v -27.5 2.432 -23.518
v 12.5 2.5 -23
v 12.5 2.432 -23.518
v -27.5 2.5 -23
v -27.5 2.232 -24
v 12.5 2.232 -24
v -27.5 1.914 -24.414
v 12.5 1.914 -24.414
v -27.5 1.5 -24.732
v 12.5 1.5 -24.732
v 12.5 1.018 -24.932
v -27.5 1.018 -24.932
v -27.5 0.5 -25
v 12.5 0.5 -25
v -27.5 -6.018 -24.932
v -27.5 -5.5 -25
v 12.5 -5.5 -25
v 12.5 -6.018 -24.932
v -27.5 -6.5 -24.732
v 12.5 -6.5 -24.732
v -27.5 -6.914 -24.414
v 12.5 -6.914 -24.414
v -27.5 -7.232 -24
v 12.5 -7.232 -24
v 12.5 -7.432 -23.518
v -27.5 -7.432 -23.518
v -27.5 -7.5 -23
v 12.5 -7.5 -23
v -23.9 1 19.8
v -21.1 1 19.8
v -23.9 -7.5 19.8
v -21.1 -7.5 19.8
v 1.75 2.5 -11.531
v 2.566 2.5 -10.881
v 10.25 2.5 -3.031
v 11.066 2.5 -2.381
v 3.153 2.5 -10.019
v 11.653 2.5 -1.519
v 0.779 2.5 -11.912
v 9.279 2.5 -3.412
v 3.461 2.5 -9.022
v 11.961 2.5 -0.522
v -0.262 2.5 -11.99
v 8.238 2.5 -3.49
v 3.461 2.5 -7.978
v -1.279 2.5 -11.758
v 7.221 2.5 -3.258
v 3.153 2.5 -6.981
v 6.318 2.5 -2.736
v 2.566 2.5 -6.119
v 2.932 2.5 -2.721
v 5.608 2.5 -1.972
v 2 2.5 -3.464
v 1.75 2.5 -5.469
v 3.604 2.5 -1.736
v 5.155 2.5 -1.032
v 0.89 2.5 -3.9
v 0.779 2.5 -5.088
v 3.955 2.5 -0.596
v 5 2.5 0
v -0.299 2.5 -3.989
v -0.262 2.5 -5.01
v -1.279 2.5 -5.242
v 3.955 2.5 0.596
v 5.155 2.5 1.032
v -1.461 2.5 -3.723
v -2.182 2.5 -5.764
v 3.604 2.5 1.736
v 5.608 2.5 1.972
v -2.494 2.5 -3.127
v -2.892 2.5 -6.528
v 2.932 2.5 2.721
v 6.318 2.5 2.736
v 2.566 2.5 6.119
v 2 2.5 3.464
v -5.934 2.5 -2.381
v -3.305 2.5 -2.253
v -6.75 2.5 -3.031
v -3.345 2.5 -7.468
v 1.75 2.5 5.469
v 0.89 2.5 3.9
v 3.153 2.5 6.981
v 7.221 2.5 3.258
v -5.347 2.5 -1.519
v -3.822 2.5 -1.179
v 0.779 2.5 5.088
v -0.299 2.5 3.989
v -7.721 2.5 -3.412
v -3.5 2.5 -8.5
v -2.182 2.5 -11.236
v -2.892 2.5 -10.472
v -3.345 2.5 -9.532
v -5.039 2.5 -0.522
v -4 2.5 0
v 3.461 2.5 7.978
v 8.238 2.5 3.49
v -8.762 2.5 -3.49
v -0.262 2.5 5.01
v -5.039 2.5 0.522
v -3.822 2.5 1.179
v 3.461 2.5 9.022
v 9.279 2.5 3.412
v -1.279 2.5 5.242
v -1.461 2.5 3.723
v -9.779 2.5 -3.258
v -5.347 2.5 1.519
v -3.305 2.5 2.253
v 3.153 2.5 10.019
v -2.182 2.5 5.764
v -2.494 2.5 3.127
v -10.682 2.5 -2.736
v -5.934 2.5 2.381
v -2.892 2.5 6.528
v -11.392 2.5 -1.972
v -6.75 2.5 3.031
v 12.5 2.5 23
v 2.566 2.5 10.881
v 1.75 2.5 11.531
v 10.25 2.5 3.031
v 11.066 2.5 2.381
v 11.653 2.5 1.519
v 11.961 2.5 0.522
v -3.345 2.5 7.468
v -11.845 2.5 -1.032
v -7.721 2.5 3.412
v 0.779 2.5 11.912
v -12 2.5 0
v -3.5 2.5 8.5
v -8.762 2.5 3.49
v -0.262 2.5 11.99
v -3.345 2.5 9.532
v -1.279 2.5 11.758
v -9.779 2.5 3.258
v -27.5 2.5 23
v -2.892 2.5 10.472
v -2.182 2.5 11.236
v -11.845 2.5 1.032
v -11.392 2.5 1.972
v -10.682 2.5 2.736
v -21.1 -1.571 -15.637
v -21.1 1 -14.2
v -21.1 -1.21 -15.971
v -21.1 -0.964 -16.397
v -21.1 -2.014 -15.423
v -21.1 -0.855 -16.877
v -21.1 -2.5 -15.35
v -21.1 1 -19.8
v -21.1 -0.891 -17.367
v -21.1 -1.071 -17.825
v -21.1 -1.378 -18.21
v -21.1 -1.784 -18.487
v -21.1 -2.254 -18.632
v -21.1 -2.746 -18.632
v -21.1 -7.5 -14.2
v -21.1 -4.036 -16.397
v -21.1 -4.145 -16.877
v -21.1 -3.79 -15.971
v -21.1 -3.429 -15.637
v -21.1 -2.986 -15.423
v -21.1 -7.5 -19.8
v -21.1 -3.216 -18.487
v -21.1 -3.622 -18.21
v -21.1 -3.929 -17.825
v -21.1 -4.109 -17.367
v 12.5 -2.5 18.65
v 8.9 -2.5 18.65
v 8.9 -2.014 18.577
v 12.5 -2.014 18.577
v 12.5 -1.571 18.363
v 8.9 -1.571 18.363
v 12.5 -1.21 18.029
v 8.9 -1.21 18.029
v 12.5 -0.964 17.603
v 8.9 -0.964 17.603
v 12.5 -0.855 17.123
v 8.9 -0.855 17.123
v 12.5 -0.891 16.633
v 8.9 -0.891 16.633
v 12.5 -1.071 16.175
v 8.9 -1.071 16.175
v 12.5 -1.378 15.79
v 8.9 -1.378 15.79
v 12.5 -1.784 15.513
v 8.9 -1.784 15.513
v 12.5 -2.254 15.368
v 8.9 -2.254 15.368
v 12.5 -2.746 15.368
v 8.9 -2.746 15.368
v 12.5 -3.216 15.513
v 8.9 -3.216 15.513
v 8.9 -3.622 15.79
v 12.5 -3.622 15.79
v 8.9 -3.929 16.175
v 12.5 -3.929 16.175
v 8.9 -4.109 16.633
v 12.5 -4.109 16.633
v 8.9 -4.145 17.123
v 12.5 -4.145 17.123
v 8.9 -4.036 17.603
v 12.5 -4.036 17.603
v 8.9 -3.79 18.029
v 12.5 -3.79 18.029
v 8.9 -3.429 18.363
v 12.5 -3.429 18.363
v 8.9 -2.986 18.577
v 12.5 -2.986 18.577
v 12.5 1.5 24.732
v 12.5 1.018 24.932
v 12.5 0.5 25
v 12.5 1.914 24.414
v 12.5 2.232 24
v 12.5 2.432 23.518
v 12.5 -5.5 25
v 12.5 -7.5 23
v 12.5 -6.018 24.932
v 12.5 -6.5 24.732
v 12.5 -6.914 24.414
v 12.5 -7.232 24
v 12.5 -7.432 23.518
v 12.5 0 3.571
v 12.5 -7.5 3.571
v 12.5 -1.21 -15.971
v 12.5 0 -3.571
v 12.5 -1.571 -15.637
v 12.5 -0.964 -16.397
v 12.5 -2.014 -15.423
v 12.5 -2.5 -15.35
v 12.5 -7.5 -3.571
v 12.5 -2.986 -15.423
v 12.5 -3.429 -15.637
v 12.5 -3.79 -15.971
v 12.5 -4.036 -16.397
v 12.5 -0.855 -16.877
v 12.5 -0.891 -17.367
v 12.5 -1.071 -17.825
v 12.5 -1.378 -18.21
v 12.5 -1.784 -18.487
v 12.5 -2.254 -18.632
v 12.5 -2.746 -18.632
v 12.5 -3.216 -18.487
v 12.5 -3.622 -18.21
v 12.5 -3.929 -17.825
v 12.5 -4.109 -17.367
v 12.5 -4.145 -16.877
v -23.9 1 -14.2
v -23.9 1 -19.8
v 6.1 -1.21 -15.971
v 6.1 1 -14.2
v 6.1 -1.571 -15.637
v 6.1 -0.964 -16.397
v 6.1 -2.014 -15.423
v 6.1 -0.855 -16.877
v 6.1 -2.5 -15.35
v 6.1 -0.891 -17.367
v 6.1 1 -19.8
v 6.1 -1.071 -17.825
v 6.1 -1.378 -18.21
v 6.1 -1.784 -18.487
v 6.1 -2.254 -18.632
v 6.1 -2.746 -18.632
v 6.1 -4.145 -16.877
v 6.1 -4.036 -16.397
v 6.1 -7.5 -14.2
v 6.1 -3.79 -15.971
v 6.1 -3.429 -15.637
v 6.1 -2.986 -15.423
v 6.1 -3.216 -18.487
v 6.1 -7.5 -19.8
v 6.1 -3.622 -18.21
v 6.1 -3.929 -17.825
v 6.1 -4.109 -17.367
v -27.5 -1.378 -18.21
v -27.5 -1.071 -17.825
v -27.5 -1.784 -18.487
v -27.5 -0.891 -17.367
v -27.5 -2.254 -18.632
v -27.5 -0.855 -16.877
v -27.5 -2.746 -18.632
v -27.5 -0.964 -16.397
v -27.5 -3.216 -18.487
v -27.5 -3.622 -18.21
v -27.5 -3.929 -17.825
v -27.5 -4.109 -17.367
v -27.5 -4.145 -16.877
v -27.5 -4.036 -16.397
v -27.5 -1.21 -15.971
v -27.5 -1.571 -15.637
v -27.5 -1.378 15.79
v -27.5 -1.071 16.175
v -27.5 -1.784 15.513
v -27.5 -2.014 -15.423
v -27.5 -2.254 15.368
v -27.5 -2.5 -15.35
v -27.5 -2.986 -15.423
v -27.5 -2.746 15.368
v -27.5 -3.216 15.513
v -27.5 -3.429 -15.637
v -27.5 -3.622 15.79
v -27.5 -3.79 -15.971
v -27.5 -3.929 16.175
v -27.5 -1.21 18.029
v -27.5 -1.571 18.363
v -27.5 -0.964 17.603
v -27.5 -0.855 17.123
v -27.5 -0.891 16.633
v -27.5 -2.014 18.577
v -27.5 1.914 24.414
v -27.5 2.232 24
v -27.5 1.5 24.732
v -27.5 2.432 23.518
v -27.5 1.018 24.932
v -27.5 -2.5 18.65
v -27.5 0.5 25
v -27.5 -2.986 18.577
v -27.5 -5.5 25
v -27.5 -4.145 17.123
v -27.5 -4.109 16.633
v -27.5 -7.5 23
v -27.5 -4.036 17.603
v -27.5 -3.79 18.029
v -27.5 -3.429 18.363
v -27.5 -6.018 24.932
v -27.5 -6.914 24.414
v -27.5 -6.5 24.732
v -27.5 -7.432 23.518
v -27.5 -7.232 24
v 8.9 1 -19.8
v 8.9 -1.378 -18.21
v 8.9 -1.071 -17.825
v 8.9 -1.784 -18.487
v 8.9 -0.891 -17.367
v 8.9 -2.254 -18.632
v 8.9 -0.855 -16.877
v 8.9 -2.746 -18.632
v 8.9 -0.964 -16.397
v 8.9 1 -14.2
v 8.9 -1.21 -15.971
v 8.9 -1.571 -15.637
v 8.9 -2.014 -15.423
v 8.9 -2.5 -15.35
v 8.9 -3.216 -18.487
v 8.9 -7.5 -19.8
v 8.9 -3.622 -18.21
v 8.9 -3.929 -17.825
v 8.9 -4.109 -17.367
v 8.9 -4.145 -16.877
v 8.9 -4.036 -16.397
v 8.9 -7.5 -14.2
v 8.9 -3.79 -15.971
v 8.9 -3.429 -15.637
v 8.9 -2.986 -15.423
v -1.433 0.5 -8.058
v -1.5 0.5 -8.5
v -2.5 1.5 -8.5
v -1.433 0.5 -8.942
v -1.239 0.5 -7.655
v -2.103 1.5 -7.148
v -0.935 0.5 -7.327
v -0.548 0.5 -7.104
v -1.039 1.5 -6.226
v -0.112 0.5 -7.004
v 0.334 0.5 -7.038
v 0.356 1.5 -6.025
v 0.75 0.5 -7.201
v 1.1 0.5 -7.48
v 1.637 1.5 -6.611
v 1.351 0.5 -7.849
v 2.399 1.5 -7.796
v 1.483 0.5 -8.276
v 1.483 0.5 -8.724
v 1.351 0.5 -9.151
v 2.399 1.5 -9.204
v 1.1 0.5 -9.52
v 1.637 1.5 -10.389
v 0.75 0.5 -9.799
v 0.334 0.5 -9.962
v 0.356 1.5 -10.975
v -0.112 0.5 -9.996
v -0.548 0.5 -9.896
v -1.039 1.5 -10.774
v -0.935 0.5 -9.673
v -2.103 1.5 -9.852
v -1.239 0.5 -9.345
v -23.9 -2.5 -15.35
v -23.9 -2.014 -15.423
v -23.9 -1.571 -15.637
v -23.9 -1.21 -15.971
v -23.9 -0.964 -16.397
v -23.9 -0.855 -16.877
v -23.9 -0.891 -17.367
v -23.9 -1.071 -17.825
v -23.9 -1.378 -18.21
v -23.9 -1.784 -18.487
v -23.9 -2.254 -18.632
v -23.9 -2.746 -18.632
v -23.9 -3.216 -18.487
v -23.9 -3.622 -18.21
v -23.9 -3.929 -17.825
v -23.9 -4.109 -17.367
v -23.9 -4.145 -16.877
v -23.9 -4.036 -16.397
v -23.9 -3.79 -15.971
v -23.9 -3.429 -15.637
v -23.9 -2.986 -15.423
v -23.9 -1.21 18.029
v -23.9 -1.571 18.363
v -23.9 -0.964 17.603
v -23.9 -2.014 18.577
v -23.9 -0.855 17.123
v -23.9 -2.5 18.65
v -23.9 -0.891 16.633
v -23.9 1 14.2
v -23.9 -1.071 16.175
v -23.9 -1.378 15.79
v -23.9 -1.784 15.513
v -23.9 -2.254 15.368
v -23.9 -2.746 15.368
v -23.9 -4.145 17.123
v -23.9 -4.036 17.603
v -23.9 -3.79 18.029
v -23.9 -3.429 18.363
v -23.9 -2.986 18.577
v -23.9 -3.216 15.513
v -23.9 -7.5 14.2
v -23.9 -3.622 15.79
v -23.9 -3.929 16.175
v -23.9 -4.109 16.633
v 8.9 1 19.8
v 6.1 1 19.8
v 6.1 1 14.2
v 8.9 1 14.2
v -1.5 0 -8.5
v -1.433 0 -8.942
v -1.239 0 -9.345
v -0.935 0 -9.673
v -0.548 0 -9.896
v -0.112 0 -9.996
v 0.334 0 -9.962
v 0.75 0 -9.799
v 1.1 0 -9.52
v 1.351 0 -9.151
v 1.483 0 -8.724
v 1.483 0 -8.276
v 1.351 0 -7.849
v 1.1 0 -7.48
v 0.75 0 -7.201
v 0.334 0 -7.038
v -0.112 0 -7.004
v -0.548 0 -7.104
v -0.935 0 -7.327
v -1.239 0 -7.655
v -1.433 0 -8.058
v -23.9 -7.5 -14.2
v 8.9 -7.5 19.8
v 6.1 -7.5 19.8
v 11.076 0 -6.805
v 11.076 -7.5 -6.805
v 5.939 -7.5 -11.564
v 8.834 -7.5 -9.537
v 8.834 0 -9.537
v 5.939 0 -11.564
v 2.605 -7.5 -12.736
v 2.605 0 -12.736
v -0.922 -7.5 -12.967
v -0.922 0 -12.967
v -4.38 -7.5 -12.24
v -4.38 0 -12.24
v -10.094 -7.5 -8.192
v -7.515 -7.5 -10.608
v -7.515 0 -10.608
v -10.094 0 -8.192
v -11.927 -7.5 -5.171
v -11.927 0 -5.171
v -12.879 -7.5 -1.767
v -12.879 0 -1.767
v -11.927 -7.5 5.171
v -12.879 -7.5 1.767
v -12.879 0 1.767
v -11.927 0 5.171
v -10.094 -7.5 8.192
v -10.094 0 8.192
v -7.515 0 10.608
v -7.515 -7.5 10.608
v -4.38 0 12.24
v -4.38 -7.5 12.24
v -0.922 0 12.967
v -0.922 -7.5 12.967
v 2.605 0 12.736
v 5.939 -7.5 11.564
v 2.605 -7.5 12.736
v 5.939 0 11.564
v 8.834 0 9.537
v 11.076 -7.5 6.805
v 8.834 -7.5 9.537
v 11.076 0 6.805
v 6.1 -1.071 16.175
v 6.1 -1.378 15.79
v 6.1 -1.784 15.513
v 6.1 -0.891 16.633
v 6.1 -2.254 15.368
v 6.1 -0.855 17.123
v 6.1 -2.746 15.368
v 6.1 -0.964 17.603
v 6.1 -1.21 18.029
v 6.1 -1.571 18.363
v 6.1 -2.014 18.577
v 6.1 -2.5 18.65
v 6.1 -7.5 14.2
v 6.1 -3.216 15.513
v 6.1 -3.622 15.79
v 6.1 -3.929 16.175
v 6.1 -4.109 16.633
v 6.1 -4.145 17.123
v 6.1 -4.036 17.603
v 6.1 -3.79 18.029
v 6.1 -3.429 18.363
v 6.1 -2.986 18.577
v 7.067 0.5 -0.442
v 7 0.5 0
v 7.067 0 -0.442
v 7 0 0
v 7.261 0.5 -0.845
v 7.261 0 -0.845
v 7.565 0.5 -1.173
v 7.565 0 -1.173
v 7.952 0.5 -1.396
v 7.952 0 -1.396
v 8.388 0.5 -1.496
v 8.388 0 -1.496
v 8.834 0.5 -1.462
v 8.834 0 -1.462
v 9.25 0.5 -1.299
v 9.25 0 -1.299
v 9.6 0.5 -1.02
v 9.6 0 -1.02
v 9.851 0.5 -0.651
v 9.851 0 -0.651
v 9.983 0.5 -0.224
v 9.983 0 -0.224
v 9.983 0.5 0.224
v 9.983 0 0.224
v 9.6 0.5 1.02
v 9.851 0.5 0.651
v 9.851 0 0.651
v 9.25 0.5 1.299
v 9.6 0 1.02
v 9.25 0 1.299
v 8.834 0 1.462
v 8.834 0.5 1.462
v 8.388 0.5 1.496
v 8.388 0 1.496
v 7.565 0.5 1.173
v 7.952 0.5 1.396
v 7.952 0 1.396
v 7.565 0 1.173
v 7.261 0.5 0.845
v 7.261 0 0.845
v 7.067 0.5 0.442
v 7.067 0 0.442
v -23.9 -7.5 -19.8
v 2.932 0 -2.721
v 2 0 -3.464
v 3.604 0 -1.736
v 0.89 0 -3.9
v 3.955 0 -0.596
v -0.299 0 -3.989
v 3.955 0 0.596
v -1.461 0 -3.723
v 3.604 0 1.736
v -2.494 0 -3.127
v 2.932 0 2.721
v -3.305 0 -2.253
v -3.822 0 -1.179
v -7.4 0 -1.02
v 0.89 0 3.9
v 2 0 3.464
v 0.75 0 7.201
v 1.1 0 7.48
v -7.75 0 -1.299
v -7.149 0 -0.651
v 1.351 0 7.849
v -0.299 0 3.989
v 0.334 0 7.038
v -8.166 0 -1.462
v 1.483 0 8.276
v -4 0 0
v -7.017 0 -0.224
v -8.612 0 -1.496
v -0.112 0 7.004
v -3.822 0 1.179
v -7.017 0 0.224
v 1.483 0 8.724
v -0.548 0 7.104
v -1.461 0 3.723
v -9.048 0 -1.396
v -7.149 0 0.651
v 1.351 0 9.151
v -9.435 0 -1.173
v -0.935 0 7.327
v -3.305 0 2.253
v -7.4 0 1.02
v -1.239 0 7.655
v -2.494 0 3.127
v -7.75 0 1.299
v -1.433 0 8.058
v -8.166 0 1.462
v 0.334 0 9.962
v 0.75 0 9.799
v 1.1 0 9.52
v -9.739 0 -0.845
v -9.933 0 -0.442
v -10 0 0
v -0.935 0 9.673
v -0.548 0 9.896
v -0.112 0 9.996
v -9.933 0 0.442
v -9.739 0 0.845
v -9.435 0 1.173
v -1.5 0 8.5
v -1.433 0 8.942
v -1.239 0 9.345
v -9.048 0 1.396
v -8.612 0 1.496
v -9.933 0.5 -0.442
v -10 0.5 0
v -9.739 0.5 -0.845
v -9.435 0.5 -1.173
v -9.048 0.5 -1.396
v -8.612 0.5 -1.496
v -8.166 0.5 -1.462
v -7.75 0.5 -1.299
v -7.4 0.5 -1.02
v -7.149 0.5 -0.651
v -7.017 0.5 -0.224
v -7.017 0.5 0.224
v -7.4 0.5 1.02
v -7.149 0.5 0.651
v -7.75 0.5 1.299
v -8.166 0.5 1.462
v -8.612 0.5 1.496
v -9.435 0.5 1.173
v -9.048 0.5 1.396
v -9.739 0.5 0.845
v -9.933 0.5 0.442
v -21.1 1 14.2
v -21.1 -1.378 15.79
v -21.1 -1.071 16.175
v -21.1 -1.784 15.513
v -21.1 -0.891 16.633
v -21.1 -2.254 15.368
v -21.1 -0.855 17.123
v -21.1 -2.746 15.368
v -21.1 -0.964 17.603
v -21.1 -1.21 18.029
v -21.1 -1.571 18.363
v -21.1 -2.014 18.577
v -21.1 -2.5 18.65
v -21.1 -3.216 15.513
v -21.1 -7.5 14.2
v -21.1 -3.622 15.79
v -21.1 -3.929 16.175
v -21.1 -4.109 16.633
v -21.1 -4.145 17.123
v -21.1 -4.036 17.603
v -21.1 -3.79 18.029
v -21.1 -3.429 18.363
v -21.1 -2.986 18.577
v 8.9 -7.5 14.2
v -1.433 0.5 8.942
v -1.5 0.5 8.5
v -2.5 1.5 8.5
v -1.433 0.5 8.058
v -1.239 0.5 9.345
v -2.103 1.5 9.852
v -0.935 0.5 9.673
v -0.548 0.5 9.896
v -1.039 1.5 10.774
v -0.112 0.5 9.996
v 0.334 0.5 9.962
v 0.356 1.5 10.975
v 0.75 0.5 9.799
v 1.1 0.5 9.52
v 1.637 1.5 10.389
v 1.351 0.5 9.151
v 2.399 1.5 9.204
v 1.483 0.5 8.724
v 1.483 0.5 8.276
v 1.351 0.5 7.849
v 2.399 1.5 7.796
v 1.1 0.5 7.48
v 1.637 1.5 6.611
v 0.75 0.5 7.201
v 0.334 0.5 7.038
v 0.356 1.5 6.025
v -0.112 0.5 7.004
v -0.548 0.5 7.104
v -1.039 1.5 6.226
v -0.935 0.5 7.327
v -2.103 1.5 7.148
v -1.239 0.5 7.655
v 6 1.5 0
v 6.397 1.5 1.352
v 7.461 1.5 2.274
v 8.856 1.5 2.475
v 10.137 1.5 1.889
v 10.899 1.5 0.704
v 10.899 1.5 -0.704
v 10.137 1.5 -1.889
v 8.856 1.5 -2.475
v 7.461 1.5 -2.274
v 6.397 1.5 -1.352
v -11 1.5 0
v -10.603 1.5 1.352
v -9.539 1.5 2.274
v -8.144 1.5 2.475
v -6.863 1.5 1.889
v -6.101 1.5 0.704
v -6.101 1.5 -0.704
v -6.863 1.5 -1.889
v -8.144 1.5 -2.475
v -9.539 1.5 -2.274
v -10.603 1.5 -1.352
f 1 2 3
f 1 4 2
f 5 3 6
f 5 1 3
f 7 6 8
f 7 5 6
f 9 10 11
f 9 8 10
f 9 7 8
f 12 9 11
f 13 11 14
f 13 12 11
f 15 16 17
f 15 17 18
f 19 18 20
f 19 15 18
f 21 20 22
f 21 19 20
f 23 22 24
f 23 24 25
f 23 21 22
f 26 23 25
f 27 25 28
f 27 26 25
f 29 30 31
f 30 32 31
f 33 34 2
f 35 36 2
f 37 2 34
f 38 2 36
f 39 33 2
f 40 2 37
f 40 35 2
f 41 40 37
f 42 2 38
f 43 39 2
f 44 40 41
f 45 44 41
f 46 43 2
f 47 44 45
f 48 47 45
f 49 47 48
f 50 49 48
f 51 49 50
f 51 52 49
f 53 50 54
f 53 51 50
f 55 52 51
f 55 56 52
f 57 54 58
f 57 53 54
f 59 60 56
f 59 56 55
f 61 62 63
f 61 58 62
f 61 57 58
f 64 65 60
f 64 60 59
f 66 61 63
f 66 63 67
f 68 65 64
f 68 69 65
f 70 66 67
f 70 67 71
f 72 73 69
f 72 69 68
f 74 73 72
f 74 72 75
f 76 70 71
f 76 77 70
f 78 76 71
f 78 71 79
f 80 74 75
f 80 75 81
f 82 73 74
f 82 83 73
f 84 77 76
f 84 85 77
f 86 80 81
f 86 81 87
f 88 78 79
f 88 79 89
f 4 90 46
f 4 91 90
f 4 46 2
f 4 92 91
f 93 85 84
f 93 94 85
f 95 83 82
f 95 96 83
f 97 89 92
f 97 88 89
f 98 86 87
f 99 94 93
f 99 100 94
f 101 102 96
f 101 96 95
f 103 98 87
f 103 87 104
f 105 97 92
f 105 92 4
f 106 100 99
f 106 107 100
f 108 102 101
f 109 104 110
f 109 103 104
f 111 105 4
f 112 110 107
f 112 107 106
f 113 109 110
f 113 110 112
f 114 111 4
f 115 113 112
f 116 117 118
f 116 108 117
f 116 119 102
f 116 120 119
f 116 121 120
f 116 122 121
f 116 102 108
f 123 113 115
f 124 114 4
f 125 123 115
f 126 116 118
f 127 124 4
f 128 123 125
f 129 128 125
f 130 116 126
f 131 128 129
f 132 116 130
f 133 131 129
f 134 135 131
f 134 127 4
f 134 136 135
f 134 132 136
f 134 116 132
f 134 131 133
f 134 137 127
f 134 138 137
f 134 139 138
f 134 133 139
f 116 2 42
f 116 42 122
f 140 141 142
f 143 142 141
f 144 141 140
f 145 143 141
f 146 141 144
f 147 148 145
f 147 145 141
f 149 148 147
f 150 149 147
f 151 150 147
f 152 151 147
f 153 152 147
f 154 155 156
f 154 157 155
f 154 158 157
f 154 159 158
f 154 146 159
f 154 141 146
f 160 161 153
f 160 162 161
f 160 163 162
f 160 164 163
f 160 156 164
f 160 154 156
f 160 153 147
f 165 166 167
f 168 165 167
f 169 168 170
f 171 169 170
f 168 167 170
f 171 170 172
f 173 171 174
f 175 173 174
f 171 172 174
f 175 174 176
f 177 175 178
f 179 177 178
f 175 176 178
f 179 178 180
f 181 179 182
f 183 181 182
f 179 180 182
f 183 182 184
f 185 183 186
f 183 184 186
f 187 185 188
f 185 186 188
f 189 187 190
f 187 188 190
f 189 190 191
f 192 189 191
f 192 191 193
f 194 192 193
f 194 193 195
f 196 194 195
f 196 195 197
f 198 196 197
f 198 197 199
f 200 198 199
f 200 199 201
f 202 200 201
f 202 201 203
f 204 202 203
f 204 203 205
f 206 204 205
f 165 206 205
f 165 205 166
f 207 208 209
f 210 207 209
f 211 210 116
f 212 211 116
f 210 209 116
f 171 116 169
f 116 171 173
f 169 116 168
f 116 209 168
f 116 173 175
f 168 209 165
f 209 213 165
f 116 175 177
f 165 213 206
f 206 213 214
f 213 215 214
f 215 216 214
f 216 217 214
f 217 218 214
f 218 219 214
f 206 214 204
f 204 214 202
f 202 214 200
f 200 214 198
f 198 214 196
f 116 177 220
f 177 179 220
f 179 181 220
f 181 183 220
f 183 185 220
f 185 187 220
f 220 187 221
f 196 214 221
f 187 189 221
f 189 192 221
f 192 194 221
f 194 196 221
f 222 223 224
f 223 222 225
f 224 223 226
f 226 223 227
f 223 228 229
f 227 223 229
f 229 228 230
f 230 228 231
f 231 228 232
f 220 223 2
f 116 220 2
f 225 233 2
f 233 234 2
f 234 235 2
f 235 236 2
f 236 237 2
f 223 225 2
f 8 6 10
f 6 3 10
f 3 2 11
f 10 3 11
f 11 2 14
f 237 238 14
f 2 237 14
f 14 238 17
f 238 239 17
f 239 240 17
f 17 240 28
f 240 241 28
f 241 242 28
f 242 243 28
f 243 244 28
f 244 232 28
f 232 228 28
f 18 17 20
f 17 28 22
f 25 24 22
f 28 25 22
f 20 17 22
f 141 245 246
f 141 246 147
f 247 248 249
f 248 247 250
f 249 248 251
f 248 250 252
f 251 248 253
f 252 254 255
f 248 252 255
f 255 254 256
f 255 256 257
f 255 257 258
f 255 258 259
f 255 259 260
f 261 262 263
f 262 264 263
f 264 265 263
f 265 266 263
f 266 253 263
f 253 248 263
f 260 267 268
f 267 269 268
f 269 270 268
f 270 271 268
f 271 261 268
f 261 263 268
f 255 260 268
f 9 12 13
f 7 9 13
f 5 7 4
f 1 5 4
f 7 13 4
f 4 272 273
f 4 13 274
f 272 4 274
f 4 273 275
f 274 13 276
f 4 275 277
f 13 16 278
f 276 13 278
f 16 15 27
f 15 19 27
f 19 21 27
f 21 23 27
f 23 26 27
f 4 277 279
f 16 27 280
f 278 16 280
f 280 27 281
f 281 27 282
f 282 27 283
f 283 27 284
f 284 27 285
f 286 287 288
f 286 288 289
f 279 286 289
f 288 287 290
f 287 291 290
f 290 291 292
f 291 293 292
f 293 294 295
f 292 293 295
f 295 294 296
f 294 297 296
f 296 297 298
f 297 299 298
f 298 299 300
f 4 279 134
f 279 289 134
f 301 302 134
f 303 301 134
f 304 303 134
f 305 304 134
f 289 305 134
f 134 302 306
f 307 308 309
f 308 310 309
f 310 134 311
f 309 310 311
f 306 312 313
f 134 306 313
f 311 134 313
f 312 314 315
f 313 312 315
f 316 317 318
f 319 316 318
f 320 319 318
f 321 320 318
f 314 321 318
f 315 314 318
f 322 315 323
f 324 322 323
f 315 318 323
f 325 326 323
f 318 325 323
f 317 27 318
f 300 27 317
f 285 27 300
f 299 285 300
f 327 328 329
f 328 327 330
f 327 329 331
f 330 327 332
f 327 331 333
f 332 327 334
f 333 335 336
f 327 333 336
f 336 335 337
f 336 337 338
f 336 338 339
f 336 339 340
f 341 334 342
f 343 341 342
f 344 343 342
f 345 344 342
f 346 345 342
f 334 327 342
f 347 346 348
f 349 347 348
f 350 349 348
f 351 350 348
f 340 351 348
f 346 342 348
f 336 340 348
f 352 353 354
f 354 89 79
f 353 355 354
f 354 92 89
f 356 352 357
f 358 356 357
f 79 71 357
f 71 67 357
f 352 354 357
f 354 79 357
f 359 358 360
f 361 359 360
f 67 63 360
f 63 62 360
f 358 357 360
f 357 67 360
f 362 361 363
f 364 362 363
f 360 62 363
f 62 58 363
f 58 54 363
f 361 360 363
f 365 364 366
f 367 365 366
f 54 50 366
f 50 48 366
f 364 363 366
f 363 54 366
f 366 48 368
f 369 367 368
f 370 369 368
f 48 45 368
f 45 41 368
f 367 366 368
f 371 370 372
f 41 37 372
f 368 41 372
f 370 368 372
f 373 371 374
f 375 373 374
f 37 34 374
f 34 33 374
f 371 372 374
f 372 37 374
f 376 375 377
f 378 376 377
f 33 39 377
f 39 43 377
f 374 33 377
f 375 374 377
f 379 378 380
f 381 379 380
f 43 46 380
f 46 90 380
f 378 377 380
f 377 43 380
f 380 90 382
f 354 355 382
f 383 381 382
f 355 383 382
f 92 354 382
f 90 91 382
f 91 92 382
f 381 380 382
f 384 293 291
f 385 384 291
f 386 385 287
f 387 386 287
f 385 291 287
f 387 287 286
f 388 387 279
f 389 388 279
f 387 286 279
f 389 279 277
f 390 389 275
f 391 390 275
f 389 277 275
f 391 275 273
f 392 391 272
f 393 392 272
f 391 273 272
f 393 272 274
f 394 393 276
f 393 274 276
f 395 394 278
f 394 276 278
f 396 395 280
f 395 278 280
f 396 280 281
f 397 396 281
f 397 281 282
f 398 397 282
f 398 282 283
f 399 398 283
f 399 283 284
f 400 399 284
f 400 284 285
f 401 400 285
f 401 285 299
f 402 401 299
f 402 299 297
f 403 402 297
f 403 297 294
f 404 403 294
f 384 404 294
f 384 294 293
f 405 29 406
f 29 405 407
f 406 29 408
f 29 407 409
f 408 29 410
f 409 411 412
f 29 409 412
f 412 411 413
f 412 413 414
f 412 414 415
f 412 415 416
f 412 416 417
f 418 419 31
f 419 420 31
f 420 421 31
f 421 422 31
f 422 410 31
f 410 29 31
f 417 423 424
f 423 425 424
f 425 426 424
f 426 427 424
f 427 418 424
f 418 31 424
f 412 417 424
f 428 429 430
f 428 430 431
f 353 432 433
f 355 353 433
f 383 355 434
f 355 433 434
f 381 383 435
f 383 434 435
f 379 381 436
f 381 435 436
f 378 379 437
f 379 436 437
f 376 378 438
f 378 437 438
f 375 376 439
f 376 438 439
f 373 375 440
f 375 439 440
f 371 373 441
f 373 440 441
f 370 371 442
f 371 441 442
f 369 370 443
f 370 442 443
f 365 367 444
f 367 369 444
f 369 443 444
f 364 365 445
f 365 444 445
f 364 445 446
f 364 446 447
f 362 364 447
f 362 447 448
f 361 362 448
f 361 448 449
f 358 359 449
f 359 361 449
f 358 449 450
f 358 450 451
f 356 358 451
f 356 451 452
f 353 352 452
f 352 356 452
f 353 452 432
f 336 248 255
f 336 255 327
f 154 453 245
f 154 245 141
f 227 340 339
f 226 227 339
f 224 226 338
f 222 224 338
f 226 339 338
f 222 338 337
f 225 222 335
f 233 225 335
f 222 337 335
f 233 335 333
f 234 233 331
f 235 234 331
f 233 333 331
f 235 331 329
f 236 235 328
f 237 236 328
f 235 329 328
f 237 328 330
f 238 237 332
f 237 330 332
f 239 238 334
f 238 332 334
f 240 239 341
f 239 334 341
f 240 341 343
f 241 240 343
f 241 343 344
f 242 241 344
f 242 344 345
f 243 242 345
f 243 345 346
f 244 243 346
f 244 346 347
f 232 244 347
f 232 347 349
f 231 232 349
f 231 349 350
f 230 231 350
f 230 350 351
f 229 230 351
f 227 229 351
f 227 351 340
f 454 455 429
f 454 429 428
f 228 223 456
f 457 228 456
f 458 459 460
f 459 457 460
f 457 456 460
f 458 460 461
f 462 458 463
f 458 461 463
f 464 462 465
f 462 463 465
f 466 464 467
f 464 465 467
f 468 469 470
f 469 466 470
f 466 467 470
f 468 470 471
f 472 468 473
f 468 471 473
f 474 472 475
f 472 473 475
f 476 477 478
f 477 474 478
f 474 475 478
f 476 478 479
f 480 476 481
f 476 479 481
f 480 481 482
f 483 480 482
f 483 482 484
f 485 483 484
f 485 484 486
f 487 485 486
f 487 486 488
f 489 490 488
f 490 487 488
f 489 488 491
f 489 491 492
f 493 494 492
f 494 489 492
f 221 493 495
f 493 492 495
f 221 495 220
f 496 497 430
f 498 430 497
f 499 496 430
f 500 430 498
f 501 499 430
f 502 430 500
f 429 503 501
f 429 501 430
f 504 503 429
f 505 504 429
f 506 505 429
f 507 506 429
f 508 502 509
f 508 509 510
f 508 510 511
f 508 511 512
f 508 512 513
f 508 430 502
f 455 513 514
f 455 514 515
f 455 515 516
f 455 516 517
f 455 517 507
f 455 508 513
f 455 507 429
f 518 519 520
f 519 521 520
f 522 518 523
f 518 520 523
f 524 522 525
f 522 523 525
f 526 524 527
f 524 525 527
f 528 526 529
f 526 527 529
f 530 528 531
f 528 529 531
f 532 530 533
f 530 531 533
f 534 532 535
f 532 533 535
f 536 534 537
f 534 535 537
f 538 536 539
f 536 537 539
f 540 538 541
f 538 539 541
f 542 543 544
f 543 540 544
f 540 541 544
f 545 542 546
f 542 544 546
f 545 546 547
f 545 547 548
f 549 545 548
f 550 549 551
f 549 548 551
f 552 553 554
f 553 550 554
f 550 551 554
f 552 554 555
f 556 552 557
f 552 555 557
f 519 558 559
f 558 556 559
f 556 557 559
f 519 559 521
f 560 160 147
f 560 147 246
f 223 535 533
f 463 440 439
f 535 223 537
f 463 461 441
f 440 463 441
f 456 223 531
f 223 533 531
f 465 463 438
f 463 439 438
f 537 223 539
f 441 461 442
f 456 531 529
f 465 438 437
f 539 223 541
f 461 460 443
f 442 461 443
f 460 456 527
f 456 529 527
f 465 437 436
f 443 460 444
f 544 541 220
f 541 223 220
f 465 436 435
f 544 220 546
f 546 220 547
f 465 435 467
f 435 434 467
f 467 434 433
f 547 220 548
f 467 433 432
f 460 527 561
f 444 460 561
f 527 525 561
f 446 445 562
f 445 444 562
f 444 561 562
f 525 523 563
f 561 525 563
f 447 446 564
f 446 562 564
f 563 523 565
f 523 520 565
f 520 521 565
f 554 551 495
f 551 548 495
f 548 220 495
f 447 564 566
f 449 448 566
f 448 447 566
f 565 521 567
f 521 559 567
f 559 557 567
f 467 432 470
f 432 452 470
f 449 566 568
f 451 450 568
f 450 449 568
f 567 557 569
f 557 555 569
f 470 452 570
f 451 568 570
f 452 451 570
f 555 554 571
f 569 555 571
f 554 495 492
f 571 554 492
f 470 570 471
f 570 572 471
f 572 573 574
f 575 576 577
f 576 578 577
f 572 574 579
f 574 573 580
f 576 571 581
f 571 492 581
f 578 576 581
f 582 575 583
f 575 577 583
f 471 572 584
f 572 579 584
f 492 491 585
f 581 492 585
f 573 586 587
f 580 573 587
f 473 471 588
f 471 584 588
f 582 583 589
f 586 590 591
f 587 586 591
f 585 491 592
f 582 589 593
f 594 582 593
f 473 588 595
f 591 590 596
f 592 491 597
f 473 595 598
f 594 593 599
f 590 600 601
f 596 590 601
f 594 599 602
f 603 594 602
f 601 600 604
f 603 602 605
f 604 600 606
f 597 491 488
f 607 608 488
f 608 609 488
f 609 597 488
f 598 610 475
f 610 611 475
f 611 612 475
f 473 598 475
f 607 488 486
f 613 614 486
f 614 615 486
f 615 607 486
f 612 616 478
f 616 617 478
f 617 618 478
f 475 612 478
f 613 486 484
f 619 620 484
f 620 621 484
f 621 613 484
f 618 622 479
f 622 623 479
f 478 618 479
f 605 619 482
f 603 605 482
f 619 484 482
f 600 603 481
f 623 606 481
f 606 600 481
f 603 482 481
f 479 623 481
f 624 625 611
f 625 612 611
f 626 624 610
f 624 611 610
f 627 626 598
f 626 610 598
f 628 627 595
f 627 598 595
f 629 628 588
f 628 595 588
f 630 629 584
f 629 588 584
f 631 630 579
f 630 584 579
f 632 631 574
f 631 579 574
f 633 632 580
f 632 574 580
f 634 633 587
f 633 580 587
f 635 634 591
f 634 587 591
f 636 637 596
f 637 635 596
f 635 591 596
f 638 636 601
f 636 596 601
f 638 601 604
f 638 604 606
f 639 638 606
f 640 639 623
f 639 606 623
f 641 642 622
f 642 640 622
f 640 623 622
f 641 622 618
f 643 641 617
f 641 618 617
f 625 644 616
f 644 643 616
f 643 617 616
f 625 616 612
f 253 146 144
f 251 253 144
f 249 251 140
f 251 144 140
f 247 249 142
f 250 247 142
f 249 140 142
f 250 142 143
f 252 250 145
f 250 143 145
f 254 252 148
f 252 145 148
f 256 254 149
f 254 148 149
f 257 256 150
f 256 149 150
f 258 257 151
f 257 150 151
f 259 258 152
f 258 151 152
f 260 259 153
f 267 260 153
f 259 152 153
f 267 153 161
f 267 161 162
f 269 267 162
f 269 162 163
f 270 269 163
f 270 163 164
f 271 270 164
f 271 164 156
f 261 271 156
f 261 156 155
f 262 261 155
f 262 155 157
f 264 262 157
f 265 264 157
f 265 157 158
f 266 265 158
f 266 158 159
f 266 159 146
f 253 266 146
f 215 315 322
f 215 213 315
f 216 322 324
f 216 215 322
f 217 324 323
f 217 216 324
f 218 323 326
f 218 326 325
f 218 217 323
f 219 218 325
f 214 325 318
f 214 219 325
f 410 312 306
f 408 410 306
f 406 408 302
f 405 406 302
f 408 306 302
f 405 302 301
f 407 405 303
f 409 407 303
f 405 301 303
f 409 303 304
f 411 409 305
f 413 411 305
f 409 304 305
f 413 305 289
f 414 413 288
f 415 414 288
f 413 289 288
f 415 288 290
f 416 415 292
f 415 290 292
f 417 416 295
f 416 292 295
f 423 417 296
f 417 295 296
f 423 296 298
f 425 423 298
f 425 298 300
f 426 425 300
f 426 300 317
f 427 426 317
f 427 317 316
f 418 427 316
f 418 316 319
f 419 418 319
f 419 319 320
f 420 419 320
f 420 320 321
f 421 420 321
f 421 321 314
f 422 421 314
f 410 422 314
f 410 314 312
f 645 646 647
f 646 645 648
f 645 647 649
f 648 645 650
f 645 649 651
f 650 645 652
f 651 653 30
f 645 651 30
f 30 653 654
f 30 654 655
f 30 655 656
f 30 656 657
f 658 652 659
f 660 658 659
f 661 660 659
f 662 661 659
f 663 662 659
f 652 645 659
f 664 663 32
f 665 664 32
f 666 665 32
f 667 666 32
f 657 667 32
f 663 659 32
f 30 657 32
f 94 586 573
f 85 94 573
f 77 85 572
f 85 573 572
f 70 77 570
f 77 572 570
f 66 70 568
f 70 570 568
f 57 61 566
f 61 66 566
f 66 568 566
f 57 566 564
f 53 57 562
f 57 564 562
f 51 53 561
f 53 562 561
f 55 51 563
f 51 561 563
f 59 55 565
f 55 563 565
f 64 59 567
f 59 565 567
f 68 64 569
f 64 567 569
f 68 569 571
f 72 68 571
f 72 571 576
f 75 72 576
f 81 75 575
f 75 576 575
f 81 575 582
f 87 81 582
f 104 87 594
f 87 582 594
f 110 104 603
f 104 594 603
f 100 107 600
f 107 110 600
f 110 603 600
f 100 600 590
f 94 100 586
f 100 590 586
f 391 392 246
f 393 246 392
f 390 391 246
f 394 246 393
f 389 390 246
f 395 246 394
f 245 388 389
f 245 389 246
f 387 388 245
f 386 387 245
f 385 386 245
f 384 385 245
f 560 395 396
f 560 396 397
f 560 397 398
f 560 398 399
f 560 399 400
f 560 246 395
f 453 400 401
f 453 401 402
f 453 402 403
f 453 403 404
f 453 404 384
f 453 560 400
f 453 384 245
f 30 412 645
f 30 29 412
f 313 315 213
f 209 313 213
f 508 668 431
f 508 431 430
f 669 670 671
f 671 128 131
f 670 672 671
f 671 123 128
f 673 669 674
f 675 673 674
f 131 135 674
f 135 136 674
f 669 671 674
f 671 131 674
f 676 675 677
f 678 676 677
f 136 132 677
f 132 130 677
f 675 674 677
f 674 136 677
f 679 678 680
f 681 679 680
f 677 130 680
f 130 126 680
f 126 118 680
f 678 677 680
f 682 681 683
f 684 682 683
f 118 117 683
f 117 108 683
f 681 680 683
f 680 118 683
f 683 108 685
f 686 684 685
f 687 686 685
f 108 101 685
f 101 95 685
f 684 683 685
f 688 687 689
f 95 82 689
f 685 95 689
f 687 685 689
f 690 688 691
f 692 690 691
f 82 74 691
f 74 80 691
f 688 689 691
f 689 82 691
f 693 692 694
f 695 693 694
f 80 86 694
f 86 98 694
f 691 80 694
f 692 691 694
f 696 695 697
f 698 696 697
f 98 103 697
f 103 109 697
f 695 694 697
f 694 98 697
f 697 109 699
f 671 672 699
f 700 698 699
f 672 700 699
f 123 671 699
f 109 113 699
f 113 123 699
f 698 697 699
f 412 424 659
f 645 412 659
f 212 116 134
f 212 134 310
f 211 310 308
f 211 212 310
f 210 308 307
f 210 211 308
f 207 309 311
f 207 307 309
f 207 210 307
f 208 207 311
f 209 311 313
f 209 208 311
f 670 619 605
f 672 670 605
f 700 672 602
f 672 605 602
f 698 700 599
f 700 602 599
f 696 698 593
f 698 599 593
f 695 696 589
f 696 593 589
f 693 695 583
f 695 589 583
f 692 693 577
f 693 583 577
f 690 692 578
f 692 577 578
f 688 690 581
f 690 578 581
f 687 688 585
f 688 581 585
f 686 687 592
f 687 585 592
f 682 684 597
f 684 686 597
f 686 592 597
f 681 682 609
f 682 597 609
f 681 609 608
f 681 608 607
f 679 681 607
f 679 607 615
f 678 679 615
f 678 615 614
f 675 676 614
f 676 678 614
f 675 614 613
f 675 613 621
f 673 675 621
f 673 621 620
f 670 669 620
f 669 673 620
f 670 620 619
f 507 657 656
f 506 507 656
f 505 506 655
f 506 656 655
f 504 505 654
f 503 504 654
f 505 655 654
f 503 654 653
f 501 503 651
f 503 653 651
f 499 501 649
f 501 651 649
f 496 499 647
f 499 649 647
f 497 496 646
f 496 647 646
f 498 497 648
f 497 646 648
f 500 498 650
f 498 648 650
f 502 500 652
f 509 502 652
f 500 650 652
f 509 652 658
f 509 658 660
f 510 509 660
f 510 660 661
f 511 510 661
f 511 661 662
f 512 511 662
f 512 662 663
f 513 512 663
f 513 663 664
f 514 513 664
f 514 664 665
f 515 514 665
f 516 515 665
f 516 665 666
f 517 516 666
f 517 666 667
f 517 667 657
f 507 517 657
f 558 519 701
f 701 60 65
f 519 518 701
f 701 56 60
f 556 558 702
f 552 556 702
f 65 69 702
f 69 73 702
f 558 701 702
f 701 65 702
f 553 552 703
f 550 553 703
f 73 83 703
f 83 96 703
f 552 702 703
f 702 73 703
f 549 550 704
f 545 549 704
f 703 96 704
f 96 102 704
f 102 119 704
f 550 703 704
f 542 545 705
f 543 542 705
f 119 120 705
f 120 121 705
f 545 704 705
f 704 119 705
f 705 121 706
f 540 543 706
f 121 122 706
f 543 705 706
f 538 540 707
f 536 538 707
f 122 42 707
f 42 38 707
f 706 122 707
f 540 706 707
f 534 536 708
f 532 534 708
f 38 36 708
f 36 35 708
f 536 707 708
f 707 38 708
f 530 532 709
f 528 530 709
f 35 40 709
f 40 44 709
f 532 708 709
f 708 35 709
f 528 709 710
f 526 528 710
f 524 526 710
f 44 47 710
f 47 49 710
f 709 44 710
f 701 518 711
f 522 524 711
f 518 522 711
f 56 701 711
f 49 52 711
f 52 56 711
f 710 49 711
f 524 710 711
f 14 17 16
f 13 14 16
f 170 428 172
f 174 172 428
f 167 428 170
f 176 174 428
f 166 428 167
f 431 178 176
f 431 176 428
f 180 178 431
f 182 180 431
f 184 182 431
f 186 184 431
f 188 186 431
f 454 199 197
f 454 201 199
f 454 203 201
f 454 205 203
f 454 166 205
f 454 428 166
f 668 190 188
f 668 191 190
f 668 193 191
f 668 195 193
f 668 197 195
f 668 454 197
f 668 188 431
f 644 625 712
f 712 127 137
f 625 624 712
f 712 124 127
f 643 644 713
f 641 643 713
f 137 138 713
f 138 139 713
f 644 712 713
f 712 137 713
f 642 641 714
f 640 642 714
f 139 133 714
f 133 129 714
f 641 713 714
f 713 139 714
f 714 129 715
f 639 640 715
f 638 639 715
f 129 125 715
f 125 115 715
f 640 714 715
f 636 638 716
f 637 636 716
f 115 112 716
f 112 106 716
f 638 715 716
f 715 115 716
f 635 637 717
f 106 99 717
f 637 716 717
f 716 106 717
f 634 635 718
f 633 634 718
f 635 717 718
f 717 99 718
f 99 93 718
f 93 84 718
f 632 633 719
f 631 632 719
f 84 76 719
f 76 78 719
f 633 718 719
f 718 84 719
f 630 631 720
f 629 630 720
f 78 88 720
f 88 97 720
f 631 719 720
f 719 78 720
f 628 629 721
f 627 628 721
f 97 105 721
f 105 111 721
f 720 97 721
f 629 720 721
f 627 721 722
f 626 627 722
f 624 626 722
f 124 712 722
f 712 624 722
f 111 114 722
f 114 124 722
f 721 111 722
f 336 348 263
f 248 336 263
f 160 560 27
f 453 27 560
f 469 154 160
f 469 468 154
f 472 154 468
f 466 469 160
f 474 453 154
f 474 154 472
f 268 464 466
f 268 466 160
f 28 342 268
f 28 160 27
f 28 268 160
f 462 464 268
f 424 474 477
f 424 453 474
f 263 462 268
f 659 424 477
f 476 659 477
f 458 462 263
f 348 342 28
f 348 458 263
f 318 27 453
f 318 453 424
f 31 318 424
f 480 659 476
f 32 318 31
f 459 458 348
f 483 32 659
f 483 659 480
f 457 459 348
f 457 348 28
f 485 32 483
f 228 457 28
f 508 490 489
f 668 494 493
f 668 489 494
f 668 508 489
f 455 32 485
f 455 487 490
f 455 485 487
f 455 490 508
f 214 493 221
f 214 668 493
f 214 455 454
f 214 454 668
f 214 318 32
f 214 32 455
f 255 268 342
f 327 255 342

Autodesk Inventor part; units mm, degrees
ref_plane "YZ Plane" through (0, 0, 0) normal (1, 0, 0) x (0, 1, 0)
ref_plane "XZ Plane" through (0, 0, 0) normal (0, 1, 0) x (-1, 0, 0)
ref_plane "XY Plane" through (0, 0, 0) normal (0, 0, 1) x (1, 0, 0)
sketch "Эскиз1" plane through (0, 0, 0) normal (0, 1, 0) x (-1, 0, 0)
  circle A0 centre (0, 0) radius 12.5 construction
  circle A1 centre (0, 0) radius 8.5 construction
  circle A2 centre (8.5, 0) radius 1.5
  circle A3 centre (-8.5, 0) radius 1.5
  circle A4 centre (0, 0) radius 4
  line L0 (27.5, 25) -> (-12.5, 25)
  line L1 (-12.5, 25) -> (-12.5, -25)
  line L2 (-12.5, -25) -> (27.5, -25)
  line L3 (27.5, -25) -> (27.5, 25)
  line L4 (0, -12.5) -> (0, 12.5) construction
  line L5 (-12.5, 0) -> (12.5, 0) construction
  circle A5 centre (0, -8.5) radius 1.5
  circle A6 centre (0, 8.5) radius 1.5
  point P0 (7.5, 25)
  point P1 (7.5, -25)
  dimension "d0" = 25
  dimension "d1" = 17
  dimension "d2" = 3
  dimension "d3" = 3
  dimension "d4" = 8
  dimension "d5" = 40
  dimension "d6" = 50
  dimension "d7" = 25
  dimension "d26" = 25
  dimension "d31" = 90
  dimension "d32" = 90
  dimension "d33" = 3
  dimension "d34" = 3
extrude "Выдавливание1" add sketch "Эскиз1" along normal blind 2.5
sketch "Эскиз2" plane through (0, 0, 0) normal (0, -1, 0) x (1, 0, 0)
  circle A0 centre (0, 0) radius 13
  line L0 (12.5, 25) -> (12.5, -25) projected
  line L1 (-27.5, 25) -> (12.5, 25) projected
  line L2 (-27.5, -25) -> (-27.5, 25) projected
  line L3 (12.5, -25) -> (-27.5, -25) projected
  circle A1 centre (-8.5, 0) radius 1.5 projected
  circle A2 centre (8.5, 0) radius 1.5 projected
  circle A3 centre (0, 0) radius 4 projected
  point P0 (12.5, -3.5707)
  point P1 (12.5, 3.5707)
  dimension "d10" = 26
extrude "Выдавливание2" add sketch "Эскиз2" along normal blind 7.5 contours A0 L0 L3 L2 L1
fillet "Сопряжение1" radius 2 4 edges at (-7.5, -7.5, -25) (-7.5, 2.5, -25) (-7.5, -7.5, 25) (-7.5, 2.5, 25)
sketch "Эскиз4" plane through (-27.5, -5.5, -25) normal (-1, 0, 0) x (0, 0, 1)
  arc A0 (50, 6) -> (48, 8) centre (48, 6) ccw projected
  line L0 (2, 8) -> (48, 8) projected
  arc A1 (2, 8) -> (0, 6) centre (2, 6) ccw projected
  line L1 (0, 0) -> (0, 6) projected
  arc A2 (0, 0) -> (2, -2) centre (2, 0) ccw projected
  line L2 (48, -2) -> (2, -2) projected
  arc A3 (48, -2) -> (50, 0) centre (48, 0) ccw projected
  line L3 (50, 0) -> (50, 6) projected
  circle A4 centre (42, 3) radius 1.65
  circle A5 centre (8, 3) radius 1.65
  point P0 (25, 5.5)
  point P1 (50, 3)
  dimension "d21" = 3.3
  dimension "d22" = 3.3
  dimension "d41" = 5
  dimension "d42" = 34
  dimension "d43" = 8
  dimension "d44" = 5
extrude "Выдавливание4" cut sketch "Эскиз4" against normal through all contours A4 | A5
chamfer "Фаска1" distance 2 angle 45 4 edges at (-7, 2.5, 0) (10, 2.5, 0) (1.5, 2.5, -8.5) (1.5, 2.5, 8.5)
sketch "Эскиз5" plane through (0, -7.5, 0) normal (0, -1, 0) x (1, 0, 0)
  line L0 (-27.5, 23) -> (12.5, 23) projected
  line L1 (-27.5, 23) -> (-27.5, -23) projected
  line L2 (12.5, -23) -> (-27.5, -23) projected
  line L3 (12.5, -23) -> (12.5, -3.5707) projected
  arc A0 (12.5, 3.5707) -> (12.5, -3.5707) centre (0, 0) ccw projected
  line L4 (12.5, 3.5707) -> (12.5, 23) projected
  line L5 (-27.5, -18.65) -> (12.5, -18.65) projected
  line L6 (-27.5, -15.35) -> (12.5, -15.35) projected
  line L7 (12.5, -18.65) -> (12.5, -15.35)
  line L8 (12.5, -17) -> (-27.5, -17) construction
  line L9 (8.9, -14.2) -> (6.1, -14.2)
  line L10 (6.1, -14.2) -> (6.1, -19.8)
  line L11 (6.1, -19.8) -> (8.9, -19.8)
  line L12 (8.9, -19.8) -> (8.9, -14.2)
  line L13 (8.9, -14.2) -> (6.1, -19.8) construction
  line L14 (6.1, -14.2) -> (8.9, -19.8) construction
  circle A1 centre (0, 0) radius 4 projected
  line L15 (0, 0) -> (12.5, 0) construction
  line L16 (12.5, 3.5707) -> (12.5, -3.5707) projected
  line L17 (-7.5, -23) -> (-7.5, 23) construction
  line L18 (8.9, 14.2) -> (6.1, 14.2)
  line L19 (6.1, 14.2) -> (6.1, 19.8)
  line L20 (6.1, 19.8) -> (8.9, 19.8)
  line L21 (8.9, 19.8) -> (8.9, 14.2)
  line L22 (8.9, 14.2) -> (6.1, 19.8) construction
  line L23 (6.1, 14.2) -> (8.9, 19.8) construction
  line L24 (-23.9, -14.2) -> (-21.1, -14.2)
  line L25 (-21.1, -14.2) -> (-21.1, -19.8)
  line L26 (-21.1, -19.8) -> (-23.9, -19.8)
  line L27 (-23.9, -19.8) -> (-23.9, -14.2)
  line L28 (-23.9, -14.2) -> (-21.1, -19.8) construction
  line L29 (-21.1, -14.2) -> (-23.9, -19.8) construction
  line L30 (-21.1, 14.2) -> (-21.1, 19.8)
  line L31 (-21.1, 19.8) -> (-23.9, 19.8)
  line L32 (-23.9, 14.2) -> (-21.1, 14.2)
  line L33 (-23.9, 19.8) -> (-23.9, 14.2)
  line L34 (-23.9, 14.2) -> (-21.1, 19.8) construction
  line L35 (-21.1, 14.2) -> (-23.9, 19.8) construction
  point P0 (7.5, -17)
  point P1 (12.5, -13.2854)
  point P2 (7.5, 17)
  point P3 (-22.5, -17)
  point P4 (-22.5, 17)
  dimension "d35" = 2.8
  dimension "d36" = 5.6
  dimension "d38" = 5
extrude "Выдавливание5" cut sketch "Эскиз5" against normal blind 8.5 contours L27 L24 L25 L6 | L6 L25 L5 L27 | L5 L25 L26 L27 | L10 L9 L12 L6 | L6 L12 L5 L10 | L5 L12 L11 L10 | L18 L19 L20 L21 | L32 L33 L31 L30
equation "\"d7\" = 0.5 * d6"
equation "\"d22\" = d21"
properties part number "motoramma_1"
